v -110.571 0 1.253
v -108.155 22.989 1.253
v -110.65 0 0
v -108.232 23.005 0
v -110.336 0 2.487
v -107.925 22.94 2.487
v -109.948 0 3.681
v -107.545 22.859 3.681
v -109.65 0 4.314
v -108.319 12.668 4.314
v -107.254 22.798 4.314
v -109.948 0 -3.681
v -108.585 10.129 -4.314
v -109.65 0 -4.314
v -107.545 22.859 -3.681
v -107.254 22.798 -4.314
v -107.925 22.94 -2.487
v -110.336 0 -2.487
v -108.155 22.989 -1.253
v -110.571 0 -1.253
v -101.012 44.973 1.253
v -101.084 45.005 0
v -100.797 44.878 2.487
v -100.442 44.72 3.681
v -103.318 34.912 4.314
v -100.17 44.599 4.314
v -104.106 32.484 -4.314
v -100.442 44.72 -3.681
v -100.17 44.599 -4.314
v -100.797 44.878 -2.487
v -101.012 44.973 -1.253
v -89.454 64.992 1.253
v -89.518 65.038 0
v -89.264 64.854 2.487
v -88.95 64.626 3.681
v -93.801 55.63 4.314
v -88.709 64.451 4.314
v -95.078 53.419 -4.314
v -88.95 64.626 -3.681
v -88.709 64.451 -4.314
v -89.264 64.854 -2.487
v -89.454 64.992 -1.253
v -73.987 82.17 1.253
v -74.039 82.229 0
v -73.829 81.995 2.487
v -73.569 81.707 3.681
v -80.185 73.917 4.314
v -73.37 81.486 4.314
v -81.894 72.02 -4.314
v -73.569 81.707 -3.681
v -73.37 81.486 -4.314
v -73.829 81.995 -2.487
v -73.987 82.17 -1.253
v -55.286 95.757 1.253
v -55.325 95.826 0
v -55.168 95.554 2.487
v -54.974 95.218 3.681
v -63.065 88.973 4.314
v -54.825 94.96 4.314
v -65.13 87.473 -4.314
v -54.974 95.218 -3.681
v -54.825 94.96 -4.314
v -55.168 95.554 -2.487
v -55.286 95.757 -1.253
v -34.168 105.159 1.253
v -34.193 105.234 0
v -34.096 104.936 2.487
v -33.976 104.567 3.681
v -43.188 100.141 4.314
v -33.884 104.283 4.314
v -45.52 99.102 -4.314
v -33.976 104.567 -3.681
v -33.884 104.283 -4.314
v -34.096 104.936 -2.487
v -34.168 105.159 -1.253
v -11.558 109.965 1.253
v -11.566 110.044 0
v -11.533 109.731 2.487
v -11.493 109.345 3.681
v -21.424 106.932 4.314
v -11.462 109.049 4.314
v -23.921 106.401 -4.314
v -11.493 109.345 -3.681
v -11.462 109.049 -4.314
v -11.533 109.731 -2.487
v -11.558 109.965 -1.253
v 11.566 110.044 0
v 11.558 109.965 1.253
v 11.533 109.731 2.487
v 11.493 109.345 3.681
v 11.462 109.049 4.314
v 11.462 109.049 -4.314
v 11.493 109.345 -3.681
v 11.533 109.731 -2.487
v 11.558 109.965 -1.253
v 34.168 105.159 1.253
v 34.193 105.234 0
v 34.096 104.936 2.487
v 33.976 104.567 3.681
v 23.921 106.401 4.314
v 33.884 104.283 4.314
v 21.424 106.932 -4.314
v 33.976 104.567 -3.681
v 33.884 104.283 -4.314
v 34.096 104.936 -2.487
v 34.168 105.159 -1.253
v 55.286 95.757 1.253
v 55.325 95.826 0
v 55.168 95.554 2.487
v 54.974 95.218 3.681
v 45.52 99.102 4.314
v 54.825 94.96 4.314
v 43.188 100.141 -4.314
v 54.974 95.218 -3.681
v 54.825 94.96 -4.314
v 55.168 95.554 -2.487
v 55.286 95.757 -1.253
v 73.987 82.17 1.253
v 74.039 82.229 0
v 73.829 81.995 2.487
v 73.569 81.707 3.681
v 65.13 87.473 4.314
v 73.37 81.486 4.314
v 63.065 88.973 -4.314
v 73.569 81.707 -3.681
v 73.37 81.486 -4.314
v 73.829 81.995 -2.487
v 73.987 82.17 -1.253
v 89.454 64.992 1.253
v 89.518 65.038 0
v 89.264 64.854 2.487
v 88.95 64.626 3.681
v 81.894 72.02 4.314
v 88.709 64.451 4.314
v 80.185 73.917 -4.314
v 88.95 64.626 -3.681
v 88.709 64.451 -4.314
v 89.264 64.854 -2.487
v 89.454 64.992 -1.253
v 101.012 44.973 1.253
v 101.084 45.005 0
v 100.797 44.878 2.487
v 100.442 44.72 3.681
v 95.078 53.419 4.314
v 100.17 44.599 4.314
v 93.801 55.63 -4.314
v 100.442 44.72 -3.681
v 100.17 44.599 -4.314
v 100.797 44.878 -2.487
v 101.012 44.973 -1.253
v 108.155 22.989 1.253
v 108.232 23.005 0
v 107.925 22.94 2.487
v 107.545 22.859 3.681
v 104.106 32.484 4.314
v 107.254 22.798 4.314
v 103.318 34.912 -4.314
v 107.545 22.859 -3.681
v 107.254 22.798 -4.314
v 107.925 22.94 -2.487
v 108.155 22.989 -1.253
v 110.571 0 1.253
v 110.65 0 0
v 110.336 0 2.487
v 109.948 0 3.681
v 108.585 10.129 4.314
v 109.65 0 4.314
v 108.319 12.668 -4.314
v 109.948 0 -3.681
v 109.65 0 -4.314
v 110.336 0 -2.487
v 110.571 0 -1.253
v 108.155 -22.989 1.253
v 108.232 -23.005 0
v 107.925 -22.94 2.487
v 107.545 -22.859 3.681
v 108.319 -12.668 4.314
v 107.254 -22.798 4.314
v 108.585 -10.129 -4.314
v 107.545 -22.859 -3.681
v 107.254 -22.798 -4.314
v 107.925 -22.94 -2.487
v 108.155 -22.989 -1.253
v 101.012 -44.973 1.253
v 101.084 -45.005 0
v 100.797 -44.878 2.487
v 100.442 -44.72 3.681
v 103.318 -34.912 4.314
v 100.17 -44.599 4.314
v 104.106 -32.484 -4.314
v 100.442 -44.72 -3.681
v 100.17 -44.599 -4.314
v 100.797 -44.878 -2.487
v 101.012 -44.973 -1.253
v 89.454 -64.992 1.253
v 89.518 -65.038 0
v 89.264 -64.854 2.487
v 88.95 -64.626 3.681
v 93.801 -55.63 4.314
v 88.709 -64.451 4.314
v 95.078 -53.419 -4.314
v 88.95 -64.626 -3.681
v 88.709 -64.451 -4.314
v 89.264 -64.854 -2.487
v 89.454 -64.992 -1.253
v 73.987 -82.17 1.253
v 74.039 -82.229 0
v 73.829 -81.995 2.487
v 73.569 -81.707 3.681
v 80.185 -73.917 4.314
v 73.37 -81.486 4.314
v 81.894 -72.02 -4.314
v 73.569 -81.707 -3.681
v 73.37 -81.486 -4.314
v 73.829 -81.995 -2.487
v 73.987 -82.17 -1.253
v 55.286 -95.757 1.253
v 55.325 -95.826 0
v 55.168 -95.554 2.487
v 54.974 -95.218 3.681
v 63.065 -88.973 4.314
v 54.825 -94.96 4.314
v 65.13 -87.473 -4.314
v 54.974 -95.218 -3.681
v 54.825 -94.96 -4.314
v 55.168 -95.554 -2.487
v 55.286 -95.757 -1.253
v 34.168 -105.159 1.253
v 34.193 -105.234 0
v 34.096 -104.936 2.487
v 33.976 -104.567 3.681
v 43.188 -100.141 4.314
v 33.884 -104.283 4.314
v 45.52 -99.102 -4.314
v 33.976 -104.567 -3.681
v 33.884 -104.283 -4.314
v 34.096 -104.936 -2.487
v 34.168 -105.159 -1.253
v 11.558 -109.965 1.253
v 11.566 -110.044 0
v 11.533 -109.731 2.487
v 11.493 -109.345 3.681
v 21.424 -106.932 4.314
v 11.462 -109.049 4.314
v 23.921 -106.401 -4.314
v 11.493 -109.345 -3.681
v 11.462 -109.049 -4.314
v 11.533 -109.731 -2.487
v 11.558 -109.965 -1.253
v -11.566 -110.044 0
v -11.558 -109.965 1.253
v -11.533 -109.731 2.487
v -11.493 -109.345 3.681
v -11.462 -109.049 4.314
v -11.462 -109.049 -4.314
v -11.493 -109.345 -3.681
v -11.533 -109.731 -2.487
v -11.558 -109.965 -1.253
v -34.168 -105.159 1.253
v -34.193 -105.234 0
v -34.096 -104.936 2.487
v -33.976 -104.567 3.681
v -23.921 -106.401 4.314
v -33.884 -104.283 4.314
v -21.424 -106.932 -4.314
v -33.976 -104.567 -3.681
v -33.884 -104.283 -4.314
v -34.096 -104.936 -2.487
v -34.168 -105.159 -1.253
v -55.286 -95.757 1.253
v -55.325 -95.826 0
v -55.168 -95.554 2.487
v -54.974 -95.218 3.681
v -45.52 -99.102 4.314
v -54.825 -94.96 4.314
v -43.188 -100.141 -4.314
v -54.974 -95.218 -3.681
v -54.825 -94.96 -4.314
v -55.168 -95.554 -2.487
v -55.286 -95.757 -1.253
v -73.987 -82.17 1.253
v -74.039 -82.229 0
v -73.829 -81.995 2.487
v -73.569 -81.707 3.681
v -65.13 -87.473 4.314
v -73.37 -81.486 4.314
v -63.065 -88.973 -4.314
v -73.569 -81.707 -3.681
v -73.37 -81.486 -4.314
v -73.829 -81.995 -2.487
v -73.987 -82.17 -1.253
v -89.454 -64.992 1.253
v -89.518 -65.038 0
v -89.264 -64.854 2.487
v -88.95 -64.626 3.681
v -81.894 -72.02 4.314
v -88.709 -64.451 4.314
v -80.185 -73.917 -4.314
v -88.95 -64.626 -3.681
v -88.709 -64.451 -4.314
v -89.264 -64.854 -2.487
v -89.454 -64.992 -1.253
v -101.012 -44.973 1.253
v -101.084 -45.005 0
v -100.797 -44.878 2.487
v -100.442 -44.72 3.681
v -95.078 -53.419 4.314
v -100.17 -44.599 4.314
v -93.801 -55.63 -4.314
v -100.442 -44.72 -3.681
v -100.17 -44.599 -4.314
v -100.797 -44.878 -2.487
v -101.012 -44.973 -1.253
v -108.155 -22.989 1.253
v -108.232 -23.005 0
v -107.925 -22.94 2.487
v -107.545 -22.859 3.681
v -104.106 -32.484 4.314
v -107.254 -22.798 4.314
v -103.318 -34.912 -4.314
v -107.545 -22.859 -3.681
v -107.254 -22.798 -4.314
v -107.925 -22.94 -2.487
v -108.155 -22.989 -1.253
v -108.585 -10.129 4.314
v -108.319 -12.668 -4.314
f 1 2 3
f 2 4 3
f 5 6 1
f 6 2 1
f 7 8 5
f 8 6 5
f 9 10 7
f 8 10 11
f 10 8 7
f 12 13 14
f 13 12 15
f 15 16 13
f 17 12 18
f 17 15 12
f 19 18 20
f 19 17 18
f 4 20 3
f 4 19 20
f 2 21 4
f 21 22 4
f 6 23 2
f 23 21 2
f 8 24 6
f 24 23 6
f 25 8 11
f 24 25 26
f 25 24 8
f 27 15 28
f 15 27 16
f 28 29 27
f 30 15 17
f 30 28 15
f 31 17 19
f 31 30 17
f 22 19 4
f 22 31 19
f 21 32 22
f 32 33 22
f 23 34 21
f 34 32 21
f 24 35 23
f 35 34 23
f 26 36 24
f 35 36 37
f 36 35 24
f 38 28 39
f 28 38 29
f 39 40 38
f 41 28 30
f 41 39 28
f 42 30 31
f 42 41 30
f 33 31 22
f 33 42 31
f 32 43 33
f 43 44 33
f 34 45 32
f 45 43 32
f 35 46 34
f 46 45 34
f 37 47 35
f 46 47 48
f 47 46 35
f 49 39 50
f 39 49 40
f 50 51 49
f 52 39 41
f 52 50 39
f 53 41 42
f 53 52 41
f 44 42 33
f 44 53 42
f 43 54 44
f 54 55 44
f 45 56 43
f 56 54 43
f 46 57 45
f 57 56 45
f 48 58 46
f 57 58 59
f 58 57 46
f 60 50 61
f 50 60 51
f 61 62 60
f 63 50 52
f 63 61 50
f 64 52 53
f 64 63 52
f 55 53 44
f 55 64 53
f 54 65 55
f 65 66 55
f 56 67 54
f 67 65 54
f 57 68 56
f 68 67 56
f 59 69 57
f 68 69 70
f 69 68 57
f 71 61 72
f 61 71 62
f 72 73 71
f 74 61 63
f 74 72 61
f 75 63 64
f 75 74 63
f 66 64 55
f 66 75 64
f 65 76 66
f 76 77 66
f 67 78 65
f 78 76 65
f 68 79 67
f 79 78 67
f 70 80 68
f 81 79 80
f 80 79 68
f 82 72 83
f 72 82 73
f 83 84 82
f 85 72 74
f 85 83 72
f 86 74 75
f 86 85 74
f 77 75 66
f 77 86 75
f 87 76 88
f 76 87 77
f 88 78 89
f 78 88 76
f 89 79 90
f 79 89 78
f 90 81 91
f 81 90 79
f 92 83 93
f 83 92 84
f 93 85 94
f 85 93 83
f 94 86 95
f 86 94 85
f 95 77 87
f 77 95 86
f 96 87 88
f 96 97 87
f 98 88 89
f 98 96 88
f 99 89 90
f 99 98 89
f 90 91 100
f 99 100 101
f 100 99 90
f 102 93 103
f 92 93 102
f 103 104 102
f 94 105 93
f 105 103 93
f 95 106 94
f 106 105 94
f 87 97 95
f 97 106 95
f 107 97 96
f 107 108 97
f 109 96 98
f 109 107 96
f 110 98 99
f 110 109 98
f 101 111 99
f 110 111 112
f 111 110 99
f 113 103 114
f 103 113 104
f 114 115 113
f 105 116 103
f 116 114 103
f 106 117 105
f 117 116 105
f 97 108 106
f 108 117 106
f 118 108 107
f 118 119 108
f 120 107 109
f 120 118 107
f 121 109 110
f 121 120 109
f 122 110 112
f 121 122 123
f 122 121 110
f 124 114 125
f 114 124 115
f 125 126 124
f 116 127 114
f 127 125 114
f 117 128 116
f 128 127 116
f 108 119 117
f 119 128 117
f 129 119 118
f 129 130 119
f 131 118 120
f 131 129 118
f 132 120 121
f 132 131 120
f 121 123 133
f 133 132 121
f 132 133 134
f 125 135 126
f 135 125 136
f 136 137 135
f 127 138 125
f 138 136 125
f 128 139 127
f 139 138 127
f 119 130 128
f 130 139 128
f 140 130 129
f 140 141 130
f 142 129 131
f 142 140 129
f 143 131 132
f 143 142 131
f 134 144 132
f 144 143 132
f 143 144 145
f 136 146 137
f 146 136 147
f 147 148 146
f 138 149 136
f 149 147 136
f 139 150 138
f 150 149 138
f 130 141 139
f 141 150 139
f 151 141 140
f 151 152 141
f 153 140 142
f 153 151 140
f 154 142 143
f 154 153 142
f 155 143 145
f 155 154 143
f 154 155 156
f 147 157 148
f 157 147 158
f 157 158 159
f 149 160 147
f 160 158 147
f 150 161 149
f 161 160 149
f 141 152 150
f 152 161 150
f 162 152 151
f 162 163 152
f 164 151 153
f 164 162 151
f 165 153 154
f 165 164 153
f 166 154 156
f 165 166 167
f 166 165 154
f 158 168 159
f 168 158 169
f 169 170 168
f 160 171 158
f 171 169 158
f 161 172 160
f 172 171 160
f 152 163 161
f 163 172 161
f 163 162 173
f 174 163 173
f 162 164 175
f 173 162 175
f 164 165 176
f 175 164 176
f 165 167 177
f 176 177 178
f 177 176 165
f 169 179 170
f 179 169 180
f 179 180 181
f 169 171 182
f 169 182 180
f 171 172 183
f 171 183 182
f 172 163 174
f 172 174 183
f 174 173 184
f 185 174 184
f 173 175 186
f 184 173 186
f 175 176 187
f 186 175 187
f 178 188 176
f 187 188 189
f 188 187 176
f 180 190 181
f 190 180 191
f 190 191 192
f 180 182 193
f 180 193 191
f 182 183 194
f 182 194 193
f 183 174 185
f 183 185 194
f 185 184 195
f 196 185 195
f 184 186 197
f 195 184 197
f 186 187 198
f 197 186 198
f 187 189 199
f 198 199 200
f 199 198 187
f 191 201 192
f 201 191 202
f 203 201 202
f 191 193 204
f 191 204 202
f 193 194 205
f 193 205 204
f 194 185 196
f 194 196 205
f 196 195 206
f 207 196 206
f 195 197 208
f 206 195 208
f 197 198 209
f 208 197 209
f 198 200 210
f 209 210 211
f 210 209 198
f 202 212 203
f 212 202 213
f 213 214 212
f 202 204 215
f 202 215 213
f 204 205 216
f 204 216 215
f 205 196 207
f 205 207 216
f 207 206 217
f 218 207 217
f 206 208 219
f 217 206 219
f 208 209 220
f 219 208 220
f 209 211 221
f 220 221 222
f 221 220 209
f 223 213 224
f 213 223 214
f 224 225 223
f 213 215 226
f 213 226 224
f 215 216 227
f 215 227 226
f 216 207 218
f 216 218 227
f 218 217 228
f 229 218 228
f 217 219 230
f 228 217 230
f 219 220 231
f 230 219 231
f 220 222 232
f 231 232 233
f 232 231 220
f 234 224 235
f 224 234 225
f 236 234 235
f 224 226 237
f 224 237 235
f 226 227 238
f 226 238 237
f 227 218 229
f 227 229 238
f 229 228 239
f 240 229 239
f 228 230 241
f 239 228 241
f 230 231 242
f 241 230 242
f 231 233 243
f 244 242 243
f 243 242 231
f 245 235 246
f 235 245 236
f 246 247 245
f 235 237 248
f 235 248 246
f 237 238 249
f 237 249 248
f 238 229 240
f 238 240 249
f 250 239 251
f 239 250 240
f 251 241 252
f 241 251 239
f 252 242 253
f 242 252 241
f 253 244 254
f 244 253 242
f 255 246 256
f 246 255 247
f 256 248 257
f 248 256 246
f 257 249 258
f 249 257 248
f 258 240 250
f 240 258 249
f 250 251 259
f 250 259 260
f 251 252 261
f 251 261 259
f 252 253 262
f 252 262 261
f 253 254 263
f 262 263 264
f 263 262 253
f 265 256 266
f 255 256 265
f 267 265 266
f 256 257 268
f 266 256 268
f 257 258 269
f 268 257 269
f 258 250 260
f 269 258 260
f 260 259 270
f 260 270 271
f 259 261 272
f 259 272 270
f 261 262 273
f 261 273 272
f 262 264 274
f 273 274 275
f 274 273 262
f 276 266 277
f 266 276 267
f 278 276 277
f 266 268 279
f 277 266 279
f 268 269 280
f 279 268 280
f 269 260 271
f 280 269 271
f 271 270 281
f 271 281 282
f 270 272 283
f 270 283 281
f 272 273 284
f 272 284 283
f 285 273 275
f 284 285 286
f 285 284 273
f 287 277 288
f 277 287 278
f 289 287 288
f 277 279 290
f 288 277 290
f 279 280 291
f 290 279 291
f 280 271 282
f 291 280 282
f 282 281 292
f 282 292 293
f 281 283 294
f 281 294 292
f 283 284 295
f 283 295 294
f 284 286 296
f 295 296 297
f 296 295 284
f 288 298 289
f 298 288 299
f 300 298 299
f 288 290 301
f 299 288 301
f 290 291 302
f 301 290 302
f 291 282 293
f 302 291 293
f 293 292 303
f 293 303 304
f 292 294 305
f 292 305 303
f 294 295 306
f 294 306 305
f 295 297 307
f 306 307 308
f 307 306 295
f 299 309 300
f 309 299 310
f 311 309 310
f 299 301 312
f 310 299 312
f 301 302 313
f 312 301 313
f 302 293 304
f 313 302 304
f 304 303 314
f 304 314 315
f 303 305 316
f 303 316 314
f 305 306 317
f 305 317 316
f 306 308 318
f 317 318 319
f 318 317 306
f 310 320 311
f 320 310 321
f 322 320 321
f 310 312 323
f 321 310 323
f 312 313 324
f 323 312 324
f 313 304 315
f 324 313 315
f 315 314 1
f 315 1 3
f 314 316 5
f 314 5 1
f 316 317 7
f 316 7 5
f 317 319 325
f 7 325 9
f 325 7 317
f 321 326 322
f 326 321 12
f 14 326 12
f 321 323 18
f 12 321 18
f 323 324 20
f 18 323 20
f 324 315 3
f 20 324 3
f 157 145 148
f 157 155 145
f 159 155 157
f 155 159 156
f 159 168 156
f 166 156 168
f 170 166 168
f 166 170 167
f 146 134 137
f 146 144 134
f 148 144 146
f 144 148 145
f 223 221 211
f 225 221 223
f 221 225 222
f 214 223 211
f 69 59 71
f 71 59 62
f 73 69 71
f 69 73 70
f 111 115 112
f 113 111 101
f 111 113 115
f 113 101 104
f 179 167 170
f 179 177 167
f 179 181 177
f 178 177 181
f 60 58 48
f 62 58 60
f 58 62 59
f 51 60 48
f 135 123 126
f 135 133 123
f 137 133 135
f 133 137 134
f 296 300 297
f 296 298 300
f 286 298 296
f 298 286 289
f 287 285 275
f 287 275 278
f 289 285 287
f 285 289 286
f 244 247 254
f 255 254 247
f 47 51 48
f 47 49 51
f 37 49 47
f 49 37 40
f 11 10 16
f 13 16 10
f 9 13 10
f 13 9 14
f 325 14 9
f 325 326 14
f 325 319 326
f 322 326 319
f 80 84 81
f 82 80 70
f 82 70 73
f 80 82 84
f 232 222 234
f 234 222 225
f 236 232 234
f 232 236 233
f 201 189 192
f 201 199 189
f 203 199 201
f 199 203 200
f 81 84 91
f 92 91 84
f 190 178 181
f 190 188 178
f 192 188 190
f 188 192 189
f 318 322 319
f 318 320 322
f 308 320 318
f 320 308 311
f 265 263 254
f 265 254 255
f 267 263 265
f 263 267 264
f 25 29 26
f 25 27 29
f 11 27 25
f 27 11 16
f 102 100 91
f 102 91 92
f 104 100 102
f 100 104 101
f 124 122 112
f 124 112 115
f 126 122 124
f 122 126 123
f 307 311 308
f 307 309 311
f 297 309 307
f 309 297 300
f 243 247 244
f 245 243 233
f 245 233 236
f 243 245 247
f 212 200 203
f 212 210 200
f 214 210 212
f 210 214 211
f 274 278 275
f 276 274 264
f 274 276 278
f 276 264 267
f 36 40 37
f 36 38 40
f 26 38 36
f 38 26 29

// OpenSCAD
weldbead();
module weldbead(d=219.3,r=10,h=1){
    difference(){
        rotate_extrude()translate([d/2-r+h,0,0])circle(r,$fn=50);
        cylinder(h=r*2+2,d=d,center=true);
    }
}
